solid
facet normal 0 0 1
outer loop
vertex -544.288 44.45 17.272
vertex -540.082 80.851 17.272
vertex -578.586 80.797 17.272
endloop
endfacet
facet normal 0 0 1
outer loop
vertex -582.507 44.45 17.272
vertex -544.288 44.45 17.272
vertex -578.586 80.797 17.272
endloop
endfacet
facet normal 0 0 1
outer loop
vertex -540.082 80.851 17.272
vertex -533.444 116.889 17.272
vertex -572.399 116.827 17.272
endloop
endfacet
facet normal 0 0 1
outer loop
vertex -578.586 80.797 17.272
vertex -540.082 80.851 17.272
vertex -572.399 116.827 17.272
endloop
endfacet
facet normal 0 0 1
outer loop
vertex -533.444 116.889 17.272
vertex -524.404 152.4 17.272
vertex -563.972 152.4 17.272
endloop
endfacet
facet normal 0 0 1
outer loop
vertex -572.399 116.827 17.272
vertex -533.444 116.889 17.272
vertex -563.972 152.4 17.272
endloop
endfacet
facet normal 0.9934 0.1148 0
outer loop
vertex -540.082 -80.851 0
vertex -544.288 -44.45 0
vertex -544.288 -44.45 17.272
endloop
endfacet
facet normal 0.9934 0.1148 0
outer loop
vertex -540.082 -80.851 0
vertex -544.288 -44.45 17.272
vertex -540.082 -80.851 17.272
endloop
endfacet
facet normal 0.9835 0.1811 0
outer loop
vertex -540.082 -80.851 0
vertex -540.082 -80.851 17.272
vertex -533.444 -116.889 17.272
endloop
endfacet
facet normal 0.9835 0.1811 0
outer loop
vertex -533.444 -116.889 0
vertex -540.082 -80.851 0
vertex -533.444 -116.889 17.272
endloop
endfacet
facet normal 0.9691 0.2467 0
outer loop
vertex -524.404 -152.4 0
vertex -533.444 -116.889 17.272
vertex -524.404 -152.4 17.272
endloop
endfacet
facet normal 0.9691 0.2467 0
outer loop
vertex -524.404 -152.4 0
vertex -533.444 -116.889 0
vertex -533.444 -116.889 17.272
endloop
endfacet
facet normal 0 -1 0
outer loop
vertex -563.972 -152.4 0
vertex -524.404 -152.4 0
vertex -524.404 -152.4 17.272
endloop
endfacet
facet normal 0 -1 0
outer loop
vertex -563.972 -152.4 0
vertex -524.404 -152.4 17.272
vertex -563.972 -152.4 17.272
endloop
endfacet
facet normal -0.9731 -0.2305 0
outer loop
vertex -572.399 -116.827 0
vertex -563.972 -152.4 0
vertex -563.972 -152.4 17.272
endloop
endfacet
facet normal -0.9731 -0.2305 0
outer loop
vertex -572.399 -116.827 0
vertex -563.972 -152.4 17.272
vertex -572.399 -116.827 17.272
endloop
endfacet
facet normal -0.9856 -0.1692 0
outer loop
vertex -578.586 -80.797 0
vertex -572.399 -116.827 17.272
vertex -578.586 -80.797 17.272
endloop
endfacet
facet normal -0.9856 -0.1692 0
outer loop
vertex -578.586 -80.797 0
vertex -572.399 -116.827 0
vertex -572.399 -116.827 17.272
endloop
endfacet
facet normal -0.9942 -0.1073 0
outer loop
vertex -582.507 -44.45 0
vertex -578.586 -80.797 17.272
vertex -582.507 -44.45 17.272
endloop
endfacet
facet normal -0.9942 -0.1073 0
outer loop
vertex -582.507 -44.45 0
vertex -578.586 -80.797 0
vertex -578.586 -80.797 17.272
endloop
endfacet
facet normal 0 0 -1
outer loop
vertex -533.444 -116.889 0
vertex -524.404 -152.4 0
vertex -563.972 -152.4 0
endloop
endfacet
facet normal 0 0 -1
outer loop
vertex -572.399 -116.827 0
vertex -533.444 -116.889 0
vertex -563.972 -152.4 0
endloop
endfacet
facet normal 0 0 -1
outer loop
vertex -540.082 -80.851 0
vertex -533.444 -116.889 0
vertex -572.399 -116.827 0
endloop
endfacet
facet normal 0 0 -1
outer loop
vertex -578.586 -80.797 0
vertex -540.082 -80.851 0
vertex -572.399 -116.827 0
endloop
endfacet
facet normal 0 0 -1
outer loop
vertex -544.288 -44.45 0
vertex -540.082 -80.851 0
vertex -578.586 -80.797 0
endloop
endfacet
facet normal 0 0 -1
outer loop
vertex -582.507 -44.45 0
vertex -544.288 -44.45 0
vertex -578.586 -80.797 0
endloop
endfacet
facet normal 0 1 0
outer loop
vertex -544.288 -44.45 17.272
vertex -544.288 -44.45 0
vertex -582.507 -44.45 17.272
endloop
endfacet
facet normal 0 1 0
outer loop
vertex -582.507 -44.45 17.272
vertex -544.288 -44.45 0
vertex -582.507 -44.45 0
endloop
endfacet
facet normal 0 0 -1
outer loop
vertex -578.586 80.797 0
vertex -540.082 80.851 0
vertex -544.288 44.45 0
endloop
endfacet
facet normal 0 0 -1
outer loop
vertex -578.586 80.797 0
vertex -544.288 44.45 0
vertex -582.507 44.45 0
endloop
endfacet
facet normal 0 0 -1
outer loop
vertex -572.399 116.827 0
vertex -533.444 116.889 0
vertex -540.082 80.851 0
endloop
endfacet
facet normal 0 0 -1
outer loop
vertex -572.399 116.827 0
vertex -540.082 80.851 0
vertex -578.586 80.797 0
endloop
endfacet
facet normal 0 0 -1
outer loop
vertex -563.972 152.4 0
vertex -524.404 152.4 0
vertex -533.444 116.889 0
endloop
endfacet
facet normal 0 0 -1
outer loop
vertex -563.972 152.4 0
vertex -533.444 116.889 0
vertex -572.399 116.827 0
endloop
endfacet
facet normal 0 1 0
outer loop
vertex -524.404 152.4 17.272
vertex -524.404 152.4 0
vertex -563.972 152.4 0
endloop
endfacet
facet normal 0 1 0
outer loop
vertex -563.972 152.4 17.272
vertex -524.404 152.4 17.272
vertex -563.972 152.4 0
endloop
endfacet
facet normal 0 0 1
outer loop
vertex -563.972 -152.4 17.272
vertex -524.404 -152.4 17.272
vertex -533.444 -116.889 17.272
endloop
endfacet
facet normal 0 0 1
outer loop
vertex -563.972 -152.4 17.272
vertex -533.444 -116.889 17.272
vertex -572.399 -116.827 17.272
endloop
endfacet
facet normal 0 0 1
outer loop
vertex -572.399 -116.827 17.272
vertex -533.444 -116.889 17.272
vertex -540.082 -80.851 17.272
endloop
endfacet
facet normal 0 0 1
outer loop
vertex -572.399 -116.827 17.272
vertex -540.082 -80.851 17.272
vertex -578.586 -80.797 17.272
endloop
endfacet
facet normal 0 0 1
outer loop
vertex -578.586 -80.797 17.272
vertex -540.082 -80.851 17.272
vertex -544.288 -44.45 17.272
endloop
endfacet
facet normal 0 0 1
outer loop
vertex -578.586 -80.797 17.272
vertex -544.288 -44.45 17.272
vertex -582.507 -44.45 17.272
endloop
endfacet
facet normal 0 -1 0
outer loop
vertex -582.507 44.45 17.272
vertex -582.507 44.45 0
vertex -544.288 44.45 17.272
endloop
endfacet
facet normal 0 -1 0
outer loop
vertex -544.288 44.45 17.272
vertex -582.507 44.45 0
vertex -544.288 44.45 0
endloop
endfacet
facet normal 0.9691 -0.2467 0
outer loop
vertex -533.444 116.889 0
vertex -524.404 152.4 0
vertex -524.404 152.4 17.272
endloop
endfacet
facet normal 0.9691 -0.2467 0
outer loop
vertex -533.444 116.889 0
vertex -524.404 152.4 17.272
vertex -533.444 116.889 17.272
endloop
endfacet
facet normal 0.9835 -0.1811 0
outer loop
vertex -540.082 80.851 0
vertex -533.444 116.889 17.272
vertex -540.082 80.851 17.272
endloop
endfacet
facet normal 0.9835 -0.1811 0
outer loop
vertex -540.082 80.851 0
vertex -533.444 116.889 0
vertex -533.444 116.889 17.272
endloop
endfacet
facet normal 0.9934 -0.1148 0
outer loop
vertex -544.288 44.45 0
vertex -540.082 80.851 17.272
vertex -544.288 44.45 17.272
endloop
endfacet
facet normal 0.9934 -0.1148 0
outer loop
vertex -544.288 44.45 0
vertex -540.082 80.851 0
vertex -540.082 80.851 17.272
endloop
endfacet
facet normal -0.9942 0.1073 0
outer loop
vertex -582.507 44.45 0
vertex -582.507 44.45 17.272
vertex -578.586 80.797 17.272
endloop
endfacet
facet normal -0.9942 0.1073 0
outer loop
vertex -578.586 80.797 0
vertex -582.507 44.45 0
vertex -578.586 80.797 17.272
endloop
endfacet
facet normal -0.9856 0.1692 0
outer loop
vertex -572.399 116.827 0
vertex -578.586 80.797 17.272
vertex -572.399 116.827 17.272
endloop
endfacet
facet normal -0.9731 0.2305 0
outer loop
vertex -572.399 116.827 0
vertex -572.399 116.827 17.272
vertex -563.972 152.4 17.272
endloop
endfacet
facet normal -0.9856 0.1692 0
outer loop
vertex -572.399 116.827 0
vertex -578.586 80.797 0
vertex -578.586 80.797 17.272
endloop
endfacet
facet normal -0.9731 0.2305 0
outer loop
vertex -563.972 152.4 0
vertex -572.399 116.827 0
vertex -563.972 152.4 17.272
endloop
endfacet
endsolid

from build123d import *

# Parameters (mm, degrees)
SKETCH1_R           = 3.175
BOSS_EXTRUDE1_DEPTH = 17.272
CUT_EXTRUDE1_START  = -17.272
CUT_EXTRUDE1_DEPTH  = 17.272


with BuildPart() as part:
    # Sketch1 → Boss-Extrude1 (new body)
    with BuildSketch(Plane.XY):
        with BuildLine():
            Line((-517.469519919, 241.3), (-494.934682501, 230.791832737))
            ThreePointArc((-494.934682501, 230.791832737), (-546.1, 0), (-494.934682501, -230.791832737))
            Line((-494.934682501, -230.791832737), (-517.469519919, -241.3))
            Line((-517.469519919, -241.3), (-532.037545668, -241.3))
            ThreePointArc((-532.037545668, -241.3), (-584.2, 0), (-532.037545668, 241.3))
            Line((-532.037545668, 241.3), (-517.469519919, 241.3))
        make_face()
        with Locations((-565.069727445, 9.525)):
            Circle(SKETCH1_R, mode=Mode.SUBTRACT)
        with Locations((-565.069727445, -9.525)):
            Circle(SKETCH1_R, mode=Mode.SUBTRACT)
        with Locations((-526.121546674, 206.375)):
            Circle(SKETCH1_R, mode=Mode.SUBTRACT)
        with Locations((-533.201525575, 187.325)):
            Circle(SKETCH1_R, mode=Mode.SUBTRACT)
        with Locations((-526.121546674, -206.375)):
            Circle(SKETCH1_R, mode=Mode.SUBTRACT)
        with Locations((-533.201525575, -187.325)):
            Circle(SKETCH1_R, mode=Mode.SUBTRACT)
    extrude(amount=BOSS_EXTRUDE1_DEPTH)

    # Sketch2 → Cut-Extrude1 (cut)
    with BuildSketch(Plane.XY.offset(17.272).offset(CUT_EXTRUDE1_START)):
        with BuildLine():
            Line((-595.242645902, 44.45), (-544.287982138, 44.45))
            ThreePointArc((-544.287982138, 44.45), (-546.1, 0), (-544.287982138, -44.45))
            Line((-544.287982138, -44.45), (-595.242645902, -44.45))
            ThreePointArc((-595.242645902, -44.45), (-596.9, 0), (-595.242645902, 44.45))
        make_face()
        with BuildLine():
            Line((-543.101360245, -247.65), (-486.718283507, -247.65))
            ThreePointArc((-486.718283507, -247.65), (-507.799328434, -200.910557317), (-524.40389968, -152.4))
            Line((-524.40389968, -152.4), (-577.116842589, -152.4))
            ThreePointArc((-577.116842589, -152.4), (-562.130186091, -200.746765565), (-543.101360245, -247.65))
        make_face()
        with BuildLine():
            Line((-543.101360245, 247.65), (-486.718283507, 247.65))
            ThreePointArc((-486.718283507, 247.65), (-507.799328434, 200.910557317), (-524.40389968, 152.4))
            Line((-524.40389968, 152.4), (-577.116842589, 152.4))
            ThreePointArc((-577.116842589, 152.4), (-562.130186091, 200.746765565), (-543.101360245, 247.65))
        make_face()
    extrude(amount=CUT_EXTRUDE1_DEPTH, mode=Mode.SUBTRACT)


with BuildPart() as cut_extrude1_piece_1:
    # of the separate pieces the step leaves, piece 1, a body of its own (cut_extrude1_pieces)
    add(part.part.solids().sort_by_distance((-563.971524104, -152.4, 0))[0])


with BuildPart() as cut_extrude1_piece_2:
    # of the separate pieces the step leaves, piece 2, a body of its own (cut_extrude1_pieces)
    add(part.part.solids().sort_by_distance((-582.506512839, 44.45, 0))[0])


solid = Compound([cut_extrude1_piece_1.part, cut_extrude1_piece_2.part])
